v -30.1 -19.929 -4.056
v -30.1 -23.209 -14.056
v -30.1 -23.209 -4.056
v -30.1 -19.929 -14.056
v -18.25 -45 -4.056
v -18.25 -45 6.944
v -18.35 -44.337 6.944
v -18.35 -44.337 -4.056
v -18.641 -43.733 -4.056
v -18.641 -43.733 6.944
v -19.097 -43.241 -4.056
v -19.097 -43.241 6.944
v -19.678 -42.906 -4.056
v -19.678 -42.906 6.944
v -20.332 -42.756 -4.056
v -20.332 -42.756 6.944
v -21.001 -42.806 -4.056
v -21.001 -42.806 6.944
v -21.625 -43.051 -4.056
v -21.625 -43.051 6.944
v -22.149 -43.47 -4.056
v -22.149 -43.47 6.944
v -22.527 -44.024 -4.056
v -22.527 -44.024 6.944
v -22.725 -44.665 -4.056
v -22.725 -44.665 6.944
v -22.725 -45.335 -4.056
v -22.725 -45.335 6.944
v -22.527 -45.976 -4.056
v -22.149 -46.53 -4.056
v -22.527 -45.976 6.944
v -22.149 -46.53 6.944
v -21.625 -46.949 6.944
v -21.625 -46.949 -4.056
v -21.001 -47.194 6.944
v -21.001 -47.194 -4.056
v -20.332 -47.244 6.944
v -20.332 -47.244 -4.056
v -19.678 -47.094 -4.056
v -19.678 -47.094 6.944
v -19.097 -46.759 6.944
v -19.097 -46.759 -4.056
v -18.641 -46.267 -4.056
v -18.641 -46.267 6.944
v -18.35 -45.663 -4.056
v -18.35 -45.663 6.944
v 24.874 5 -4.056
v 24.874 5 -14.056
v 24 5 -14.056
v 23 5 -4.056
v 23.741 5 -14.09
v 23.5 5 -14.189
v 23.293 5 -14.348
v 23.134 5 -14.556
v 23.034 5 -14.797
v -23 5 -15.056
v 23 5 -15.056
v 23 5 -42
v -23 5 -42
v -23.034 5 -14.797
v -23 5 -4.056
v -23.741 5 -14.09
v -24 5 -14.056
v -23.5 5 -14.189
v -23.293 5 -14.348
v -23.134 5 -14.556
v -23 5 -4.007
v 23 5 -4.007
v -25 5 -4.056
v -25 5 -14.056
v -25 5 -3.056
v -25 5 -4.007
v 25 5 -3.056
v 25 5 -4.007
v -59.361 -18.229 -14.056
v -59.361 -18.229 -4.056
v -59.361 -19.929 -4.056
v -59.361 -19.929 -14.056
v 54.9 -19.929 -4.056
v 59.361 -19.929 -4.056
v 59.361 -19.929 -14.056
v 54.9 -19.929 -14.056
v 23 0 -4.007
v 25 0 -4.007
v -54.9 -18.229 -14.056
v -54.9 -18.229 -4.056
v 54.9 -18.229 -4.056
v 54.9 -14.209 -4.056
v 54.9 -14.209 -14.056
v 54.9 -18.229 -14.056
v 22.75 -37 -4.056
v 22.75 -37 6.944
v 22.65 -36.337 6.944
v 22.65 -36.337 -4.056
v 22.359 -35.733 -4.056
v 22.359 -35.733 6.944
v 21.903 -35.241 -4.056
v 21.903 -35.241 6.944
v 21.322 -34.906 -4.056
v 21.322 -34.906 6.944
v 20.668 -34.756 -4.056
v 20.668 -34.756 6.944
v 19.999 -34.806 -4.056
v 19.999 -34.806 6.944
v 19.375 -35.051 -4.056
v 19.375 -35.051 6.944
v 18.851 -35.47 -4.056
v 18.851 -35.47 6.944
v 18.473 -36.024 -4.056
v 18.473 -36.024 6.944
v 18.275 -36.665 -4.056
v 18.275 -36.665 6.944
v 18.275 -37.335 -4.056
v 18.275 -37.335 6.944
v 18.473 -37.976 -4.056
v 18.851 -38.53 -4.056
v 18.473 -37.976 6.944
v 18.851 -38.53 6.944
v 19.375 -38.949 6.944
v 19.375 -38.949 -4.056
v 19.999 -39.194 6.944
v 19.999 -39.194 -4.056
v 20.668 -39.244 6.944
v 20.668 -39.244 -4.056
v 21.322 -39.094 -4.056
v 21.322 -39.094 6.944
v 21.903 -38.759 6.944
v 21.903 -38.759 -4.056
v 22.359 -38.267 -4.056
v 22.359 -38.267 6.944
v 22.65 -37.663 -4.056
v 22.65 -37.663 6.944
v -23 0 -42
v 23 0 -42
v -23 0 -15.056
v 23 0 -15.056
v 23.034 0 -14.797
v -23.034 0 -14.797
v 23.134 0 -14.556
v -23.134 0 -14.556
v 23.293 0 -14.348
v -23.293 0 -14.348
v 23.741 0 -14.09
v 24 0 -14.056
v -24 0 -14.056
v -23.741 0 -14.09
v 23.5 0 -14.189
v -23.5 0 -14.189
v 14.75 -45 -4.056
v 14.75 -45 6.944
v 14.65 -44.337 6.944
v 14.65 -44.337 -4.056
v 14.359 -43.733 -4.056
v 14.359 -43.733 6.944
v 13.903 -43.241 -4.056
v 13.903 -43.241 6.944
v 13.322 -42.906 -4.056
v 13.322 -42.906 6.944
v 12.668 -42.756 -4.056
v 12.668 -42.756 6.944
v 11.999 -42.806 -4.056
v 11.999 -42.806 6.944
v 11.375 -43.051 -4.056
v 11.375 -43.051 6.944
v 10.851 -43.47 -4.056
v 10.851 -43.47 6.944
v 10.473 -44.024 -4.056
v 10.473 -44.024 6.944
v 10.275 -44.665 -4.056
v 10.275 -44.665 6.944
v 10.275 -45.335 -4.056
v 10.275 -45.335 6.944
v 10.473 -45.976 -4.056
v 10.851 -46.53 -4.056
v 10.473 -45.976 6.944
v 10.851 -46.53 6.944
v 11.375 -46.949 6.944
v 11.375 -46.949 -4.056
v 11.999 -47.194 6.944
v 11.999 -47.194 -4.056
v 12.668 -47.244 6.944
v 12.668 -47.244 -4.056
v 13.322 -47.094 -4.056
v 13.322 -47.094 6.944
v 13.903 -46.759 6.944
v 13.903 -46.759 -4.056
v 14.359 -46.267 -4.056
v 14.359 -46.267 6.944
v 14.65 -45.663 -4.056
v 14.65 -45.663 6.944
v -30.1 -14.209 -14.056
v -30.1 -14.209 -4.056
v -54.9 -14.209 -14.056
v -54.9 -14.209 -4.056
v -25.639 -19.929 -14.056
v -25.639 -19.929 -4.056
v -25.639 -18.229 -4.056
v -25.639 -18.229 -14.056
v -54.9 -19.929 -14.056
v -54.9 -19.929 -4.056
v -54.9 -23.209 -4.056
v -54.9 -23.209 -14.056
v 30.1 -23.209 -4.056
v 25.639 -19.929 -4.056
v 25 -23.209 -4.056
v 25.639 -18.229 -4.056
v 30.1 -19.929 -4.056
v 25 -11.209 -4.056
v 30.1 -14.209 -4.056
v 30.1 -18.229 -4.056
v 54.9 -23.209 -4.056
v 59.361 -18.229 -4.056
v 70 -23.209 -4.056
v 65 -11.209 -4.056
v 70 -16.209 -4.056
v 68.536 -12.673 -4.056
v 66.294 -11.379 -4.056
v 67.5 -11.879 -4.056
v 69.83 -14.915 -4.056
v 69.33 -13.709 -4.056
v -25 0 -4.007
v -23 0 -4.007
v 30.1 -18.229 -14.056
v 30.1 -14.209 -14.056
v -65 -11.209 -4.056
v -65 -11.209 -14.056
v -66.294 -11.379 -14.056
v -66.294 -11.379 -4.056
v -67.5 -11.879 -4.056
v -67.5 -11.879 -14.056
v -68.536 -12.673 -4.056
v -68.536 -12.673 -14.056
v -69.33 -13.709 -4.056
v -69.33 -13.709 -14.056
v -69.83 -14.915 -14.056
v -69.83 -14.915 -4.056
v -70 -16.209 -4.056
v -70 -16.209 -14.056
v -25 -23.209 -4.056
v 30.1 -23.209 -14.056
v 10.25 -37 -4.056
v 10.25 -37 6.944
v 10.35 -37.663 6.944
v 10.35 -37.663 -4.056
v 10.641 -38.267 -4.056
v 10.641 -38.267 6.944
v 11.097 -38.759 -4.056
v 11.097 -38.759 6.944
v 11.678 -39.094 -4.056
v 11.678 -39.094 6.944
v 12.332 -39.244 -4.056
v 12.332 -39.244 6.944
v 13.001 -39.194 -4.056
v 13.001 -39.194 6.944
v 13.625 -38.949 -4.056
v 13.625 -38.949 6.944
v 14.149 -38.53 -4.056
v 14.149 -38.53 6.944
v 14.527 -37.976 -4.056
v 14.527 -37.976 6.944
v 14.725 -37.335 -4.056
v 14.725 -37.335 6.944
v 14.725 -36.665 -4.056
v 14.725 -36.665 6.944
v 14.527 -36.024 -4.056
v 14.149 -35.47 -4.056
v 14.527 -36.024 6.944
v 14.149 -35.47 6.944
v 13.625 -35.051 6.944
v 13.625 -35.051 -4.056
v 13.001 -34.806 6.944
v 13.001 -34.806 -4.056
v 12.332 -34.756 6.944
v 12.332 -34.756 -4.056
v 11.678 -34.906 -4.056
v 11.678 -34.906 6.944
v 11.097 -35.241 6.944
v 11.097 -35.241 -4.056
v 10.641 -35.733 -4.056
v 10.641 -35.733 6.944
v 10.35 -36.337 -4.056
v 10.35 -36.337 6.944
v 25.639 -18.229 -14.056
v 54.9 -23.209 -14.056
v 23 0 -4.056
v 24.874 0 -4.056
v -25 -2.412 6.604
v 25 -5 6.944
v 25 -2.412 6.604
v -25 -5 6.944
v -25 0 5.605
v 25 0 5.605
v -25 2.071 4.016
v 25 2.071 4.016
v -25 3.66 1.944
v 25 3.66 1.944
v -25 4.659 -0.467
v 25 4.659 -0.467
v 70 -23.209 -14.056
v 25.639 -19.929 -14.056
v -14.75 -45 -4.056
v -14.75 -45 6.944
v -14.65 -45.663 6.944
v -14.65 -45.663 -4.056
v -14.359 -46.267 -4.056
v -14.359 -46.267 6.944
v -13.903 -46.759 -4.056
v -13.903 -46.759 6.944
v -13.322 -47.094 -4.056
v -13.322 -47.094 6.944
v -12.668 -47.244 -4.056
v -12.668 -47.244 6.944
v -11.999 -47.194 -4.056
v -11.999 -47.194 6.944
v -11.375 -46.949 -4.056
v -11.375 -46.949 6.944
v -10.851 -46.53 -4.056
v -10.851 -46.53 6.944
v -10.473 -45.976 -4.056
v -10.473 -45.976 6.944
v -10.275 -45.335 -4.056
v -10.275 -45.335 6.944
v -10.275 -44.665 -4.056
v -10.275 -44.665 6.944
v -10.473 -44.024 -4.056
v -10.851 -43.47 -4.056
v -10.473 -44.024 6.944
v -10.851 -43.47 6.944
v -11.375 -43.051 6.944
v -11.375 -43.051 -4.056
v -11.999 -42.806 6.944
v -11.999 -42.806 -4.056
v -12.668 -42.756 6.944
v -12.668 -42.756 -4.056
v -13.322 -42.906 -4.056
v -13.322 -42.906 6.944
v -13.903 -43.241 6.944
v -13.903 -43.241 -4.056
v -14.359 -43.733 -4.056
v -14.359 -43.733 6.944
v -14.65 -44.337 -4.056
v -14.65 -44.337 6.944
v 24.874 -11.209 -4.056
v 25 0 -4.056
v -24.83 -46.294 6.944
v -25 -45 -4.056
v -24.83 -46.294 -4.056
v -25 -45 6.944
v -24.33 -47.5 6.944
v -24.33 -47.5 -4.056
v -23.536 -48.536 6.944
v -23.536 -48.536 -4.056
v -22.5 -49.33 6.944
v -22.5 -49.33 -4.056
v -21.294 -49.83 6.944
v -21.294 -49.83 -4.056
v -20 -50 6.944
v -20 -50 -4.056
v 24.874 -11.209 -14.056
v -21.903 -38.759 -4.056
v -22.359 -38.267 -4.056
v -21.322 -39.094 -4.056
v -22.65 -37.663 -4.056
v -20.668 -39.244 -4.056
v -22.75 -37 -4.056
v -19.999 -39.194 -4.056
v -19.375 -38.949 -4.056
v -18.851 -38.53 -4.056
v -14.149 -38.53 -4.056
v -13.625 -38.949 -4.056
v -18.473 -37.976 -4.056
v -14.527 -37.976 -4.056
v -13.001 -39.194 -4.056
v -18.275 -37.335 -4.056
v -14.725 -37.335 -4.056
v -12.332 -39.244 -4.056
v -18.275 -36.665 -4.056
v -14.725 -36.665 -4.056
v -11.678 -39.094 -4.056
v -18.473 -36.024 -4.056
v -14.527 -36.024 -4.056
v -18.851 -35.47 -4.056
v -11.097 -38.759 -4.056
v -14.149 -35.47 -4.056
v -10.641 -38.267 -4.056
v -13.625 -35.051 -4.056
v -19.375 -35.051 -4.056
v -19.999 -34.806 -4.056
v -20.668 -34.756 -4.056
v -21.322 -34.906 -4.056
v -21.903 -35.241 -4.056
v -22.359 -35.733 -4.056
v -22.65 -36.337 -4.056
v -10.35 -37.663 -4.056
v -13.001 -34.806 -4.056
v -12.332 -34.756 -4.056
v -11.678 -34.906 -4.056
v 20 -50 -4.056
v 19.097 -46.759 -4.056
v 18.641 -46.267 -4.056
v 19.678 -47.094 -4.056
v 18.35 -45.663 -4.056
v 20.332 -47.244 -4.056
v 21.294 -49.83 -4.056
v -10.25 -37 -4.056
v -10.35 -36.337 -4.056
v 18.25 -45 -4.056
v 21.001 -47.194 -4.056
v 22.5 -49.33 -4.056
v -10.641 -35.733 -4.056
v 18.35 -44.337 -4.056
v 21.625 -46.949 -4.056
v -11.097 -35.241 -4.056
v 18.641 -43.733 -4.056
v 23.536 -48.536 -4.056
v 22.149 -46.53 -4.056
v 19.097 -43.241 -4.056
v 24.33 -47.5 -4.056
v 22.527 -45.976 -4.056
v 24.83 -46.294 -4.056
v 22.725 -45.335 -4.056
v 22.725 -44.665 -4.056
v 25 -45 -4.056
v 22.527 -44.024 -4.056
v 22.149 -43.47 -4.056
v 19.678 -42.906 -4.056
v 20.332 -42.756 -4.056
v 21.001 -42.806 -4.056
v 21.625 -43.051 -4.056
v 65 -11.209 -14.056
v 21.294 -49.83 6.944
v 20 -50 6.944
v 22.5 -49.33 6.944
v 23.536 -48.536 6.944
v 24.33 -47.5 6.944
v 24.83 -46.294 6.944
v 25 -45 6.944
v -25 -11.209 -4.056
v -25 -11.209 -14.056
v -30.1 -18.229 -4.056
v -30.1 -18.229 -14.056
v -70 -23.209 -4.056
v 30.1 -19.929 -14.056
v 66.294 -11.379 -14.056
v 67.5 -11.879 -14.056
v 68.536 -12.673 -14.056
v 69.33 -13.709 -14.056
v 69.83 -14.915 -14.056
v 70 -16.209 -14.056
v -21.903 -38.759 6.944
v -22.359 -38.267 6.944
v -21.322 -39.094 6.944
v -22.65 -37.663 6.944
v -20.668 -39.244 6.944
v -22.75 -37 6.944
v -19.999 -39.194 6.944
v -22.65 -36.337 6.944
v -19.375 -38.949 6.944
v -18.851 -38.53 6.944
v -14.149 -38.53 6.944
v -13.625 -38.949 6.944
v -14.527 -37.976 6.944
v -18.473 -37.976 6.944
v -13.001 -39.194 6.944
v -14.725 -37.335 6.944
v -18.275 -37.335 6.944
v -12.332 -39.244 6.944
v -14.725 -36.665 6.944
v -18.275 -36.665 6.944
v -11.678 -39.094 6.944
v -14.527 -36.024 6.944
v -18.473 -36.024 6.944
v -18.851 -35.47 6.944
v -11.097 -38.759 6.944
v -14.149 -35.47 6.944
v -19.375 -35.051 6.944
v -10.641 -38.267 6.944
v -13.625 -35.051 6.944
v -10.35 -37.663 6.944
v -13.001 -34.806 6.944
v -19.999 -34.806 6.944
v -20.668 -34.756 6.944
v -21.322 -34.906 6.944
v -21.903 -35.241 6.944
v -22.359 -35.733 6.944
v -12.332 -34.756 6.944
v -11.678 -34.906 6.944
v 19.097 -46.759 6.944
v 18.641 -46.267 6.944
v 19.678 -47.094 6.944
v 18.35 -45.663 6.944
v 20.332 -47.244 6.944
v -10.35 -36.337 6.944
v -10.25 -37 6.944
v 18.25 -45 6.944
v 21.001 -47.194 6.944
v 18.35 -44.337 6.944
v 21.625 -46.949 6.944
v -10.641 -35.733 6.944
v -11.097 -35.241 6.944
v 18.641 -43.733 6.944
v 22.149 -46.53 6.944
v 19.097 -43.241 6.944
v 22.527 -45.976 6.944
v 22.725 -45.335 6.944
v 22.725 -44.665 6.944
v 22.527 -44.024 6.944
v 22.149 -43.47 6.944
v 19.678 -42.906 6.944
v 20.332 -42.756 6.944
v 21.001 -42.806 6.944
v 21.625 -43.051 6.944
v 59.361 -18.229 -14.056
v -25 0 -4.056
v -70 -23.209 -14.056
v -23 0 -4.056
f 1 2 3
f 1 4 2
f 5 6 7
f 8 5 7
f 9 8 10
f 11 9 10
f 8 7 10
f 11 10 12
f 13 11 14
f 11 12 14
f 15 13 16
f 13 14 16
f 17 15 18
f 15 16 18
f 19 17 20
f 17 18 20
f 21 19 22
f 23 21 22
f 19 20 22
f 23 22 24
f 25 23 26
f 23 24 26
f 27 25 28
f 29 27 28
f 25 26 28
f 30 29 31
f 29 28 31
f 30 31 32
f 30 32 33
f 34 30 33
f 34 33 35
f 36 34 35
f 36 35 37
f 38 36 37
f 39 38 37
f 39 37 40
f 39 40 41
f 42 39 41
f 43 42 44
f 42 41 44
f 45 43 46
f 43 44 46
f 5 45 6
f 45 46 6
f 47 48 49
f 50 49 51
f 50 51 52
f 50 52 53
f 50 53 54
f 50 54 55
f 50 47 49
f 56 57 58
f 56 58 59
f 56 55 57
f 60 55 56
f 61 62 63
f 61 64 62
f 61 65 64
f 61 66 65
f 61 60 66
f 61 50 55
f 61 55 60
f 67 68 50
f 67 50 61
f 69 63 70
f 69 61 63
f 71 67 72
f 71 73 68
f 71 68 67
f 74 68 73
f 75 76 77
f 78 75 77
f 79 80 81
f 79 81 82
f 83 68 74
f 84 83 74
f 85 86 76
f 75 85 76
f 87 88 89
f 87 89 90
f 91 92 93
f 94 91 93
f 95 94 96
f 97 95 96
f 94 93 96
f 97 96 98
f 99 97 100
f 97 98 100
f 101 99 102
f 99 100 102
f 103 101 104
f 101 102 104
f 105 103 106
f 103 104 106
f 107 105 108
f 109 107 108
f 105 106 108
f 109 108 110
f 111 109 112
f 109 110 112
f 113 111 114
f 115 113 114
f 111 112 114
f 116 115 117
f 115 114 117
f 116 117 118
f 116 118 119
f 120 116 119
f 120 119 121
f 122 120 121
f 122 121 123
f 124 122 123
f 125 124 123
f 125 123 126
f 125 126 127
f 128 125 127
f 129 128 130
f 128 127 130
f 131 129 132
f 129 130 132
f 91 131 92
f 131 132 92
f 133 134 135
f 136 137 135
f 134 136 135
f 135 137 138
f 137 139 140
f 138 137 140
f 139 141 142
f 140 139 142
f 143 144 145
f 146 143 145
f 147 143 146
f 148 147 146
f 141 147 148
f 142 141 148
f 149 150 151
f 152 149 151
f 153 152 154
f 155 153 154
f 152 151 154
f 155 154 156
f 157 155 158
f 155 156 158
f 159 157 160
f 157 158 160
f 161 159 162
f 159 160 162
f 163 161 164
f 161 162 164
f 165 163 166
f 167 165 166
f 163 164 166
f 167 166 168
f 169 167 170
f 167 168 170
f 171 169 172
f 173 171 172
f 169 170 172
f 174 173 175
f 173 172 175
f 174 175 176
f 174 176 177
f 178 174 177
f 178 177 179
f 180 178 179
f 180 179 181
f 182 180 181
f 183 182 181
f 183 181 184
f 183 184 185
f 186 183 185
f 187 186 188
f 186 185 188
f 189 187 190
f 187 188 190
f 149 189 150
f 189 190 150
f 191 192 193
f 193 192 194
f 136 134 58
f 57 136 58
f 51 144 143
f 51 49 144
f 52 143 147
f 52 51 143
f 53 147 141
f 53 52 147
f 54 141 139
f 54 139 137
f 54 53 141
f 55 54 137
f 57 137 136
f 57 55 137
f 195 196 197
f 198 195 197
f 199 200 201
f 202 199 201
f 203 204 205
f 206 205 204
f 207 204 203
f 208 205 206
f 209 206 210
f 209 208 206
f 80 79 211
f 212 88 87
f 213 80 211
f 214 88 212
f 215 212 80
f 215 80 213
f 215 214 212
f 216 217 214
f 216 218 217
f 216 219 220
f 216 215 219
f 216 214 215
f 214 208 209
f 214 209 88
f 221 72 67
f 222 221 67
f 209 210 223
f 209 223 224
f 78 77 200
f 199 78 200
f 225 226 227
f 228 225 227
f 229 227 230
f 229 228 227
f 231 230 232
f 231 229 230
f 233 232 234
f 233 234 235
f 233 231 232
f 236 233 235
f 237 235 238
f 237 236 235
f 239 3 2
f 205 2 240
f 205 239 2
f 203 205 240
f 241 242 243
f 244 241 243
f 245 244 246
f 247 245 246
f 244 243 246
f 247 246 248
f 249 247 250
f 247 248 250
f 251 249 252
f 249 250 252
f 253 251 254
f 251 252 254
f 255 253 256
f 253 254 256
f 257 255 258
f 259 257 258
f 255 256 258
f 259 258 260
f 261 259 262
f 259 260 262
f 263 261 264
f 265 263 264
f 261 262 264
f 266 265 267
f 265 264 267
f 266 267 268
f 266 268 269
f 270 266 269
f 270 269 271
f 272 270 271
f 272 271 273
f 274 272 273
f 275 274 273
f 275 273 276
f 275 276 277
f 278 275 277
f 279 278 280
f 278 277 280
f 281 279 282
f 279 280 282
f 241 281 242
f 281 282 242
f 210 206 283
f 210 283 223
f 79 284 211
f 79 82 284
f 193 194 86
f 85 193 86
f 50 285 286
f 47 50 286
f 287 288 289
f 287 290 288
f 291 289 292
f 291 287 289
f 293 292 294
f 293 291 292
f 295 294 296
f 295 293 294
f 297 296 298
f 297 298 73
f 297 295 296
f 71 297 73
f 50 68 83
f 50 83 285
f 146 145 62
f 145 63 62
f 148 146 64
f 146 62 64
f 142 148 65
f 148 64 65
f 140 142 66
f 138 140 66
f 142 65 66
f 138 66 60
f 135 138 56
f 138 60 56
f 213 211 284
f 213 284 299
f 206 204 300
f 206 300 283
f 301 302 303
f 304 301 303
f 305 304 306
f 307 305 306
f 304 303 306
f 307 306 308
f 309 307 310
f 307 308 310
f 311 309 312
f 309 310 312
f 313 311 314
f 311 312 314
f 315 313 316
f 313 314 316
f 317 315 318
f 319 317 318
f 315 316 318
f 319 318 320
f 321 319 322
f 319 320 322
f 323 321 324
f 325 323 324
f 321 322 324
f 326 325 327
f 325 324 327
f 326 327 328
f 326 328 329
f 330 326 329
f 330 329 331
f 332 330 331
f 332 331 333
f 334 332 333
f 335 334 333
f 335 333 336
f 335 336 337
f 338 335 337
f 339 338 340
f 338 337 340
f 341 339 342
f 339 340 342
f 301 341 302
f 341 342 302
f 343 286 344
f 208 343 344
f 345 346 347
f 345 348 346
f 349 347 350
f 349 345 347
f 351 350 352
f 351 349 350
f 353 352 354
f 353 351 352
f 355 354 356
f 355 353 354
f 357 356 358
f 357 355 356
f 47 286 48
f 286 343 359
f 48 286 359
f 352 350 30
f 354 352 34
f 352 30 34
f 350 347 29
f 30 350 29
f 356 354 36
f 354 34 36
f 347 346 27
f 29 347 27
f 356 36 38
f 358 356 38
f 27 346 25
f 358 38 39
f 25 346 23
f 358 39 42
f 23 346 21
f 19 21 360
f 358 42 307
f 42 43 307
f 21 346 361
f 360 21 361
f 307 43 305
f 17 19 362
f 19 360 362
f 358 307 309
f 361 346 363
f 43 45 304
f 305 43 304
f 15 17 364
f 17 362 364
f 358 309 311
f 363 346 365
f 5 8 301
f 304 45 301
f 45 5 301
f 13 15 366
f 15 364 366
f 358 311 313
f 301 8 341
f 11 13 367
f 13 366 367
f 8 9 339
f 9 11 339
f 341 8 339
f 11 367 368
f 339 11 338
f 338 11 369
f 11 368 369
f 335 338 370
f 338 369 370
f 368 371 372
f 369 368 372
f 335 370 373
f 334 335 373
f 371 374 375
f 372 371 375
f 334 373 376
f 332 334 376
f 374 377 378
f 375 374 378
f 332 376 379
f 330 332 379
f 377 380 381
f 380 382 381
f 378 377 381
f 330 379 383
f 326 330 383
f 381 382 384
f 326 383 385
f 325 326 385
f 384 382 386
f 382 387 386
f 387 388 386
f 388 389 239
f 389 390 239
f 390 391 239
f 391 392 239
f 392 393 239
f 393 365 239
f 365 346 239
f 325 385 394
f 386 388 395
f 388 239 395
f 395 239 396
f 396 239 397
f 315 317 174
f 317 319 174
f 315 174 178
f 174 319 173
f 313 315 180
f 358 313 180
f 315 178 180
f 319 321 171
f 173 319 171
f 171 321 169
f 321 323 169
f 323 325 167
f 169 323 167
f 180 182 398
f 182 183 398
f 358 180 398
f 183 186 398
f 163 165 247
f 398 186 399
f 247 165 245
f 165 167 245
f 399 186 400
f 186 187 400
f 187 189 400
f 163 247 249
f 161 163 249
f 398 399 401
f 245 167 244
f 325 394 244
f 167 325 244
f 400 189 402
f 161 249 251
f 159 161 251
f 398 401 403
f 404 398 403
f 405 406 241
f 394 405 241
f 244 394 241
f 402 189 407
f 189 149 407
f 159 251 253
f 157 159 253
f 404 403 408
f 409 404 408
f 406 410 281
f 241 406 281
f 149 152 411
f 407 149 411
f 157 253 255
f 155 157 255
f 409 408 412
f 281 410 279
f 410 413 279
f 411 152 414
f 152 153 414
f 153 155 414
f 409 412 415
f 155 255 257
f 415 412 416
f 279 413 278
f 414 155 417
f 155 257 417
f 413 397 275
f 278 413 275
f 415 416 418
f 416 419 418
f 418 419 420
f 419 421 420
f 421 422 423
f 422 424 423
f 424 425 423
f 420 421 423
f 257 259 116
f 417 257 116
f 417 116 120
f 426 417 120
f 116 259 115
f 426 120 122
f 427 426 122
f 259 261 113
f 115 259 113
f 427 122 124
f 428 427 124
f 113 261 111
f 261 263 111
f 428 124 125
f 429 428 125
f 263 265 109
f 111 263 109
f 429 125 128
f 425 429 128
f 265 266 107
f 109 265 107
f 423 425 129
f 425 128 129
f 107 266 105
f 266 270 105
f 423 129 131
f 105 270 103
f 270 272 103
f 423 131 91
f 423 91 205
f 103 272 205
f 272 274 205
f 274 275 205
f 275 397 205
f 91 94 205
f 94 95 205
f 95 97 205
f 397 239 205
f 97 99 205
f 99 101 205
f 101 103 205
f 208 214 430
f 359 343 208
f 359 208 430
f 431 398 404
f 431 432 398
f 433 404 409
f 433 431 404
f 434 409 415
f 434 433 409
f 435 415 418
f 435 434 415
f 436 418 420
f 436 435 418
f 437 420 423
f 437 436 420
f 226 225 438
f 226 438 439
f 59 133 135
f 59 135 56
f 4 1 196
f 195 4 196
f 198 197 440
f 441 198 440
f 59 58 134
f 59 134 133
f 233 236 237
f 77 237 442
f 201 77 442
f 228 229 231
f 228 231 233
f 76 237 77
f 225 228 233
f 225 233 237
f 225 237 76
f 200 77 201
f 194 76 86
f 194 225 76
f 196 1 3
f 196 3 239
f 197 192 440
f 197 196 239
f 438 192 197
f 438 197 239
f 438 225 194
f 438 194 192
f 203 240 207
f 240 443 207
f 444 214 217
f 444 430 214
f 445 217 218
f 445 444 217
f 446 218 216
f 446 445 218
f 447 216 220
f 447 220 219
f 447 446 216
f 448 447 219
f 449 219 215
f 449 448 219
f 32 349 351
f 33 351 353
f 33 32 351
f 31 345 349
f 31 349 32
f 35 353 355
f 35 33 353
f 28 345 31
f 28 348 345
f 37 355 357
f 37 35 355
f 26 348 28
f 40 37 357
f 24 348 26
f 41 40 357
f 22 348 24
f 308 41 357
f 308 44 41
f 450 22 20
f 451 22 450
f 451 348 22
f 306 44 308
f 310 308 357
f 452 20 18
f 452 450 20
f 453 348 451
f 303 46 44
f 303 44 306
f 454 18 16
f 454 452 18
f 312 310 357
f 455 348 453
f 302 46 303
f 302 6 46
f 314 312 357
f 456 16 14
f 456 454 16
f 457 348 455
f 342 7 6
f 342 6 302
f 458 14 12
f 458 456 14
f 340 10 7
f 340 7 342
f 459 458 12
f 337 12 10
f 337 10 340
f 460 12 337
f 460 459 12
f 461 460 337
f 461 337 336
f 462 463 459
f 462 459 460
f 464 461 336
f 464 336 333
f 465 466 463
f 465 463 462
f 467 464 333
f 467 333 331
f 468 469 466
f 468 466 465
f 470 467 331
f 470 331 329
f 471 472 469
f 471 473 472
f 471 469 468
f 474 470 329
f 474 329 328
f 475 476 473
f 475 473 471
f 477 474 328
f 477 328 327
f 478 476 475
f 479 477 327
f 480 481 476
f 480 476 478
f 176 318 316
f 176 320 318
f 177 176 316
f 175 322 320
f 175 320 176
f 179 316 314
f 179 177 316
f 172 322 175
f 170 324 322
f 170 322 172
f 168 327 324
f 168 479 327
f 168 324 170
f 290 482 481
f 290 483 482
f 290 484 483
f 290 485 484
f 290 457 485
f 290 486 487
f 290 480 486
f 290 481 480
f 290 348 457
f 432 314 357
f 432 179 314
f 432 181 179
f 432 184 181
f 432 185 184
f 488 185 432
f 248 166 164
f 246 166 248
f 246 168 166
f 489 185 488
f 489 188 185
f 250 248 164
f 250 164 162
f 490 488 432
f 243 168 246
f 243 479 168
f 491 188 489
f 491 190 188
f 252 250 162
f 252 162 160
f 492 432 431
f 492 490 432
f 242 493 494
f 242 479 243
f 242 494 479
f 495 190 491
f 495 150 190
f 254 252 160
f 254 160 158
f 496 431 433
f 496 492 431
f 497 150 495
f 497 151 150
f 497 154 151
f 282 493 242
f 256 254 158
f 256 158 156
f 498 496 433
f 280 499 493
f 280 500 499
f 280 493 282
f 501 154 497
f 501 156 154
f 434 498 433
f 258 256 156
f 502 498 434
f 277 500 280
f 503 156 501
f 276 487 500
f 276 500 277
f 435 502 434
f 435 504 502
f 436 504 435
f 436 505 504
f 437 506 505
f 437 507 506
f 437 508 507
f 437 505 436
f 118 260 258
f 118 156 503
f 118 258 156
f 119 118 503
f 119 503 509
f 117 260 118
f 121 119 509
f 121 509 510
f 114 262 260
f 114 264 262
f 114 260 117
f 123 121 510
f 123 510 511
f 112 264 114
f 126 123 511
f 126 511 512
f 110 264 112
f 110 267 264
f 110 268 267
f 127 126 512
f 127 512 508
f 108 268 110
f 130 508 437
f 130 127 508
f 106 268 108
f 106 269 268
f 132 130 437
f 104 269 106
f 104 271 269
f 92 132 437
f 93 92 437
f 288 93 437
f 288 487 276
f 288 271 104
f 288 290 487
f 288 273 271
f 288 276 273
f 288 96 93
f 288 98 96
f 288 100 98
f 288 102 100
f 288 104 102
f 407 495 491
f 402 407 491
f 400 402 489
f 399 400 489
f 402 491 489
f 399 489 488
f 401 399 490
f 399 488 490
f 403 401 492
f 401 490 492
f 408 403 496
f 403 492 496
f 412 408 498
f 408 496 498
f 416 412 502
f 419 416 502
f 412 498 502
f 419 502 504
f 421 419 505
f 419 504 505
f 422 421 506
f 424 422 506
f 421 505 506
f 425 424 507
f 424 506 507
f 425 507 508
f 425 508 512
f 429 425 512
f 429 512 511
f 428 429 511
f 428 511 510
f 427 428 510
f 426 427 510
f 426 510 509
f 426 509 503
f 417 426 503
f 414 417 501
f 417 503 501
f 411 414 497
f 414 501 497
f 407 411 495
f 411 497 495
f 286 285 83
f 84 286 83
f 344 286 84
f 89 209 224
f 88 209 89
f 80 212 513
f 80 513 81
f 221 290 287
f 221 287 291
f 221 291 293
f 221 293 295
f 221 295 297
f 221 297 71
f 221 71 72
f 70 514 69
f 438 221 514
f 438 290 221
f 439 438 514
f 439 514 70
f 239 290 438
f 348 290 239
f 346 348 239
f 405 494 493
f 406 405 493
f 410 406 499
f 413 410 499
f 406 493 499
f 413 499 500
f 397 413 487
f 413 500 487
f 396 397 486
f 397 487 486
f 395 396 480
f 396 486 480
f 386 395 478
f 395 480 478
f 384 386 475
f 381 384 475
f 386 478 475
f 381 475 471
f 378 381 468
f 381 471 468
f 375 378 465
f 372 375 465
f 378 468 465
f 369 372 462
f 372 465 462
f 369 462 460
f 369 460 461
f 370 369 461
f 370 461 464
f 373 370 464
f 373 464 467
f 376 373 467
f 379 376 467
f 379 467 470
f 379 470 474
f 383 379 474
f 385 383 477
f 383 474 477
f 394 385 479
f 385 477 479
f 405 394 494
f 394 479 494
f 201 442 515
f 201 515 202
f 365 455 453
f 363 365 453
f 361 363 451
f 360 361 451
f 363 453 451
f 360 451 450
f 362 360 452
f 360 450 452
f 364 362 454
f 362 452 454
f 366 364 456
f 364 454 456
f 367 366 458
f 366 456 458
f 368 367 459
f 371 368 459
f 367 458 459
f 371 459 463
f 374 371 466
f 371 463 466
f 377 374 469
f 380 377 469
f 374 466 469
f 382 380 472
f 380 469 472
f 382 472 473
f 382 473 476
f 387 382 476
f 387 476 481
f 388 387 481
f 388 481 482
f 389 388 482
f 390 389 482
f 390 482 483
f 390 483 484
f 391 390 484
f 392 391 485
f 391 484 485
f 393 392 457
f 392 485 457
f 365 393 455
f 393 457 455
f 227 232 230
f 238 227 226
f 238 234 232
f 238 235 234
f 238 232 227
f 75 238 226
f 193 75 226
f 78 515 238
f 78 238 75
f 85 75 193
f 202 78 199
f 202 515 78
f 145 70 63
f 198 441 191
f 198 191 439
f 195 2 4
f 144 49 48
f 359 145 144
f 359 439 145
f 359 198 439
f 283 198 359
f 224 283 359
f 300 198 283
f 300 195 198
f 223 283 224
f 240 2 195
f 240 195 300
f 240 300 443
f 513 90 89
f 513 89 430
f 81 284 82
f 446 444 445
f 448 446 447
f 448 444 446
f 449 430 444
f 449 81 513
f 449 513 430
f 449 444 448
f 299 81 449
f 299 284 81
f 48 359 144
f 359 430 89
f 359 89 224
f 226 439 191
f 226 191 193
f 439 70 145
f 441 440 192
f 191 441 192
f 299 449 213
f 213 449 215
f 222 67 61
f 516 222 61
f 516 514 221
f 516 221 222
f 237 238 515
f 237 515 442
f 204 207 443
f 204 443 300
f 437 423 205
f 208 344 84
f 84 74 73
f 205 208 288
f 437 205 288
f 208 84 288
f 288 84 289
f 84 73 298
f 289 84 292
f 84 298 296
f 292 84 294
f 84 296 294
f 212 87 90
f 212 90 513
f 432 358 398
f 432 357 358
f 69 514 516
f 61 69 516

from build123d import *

# Parameters (mm, degrees)
BOSS_EXTRUDE5_DEPTH  = 5
SKETCH3_W            = 50
SKETCH3_H            = 11
BOSS_EXTRUDE6_DEPTH  = 50
SKETCH5_R            = 2.25
CUT_EXTRUDE1_DEPTH   = 11
BOSS_EXTRUDE8_DEPTH  = 10
CUT_EXTRUDE2_DEPTH   = 10
SKETCH8_W            = 2
SKETCH8_H            = 15.993233409
CUT_EXTRUDE3_DEPTH   = 5
SKETCH9_W            = 10
SKETCH9_H            = 10
BOSS_EXTRUDE9_DEPTH  = 10
SKETCH10_W           = 10
SKETCH10_H           = 10
BOSS_EXTRUDE10_DEPTH = 10
FILLET1_R            = 10
FILLET2_R            = 5
SKETCH11_W           = 15.1
SKETCH11_H           = 10
BOSS_EXTRUDE11_DEPTH = 2
SKETCH12_W           = 60.2
SKETCH12_H           = 10
BOSS_EXTRUDE12_DEPTH = 2
BOSS_EXTRUDE14_REACH = 84.491
SKETCH14_W           = 49.873600962
SKETCH14_H           = 10
FILLET3_R            = 1
SKETCH15_W           = 46
SKETCH15_H           = 5
BOSS_EXTRUDE15_DEPTH = 22


with BuildPart() as part:
    # Sketch1 → Boss-Extrude5 (new body)
    with BuildSketch(Plane(origin=(0, 0, 0), x_dir=(1, 0, 0), z_dir=(0, 1, 0))):
        Polygon((-25, 20), (25, 20), (25, 0), (25, -6.94447706), (-25, -6.94447706), (-25, 0.55552294), align=None)
    extrude(amount=BOSS_EXTRUDE5_DEPTH)

    # Sketch3 → Boss-Extrude6 (add)
    with BuildSketch(Plane.XZ):
        with Locations((0, 1.44447706)):
            Rectangle(SKETCH3_W, SKETCH3_H)
    extrude(amount=BOSS_EXTRUDE6_DEPTH)

    # Sketch5 → Cut-Extrude1 (cut)
    with BuildSketch(Plane.XY.offset(6.94447706)):
        with Locations((-20.5, -45)):
            Circle(SKETCH5_R)
        with Locations(Location((-20.5, -37, 0), (0, 0, 180))):
            Circle(SKETCH5_R)
        with Locations(Location((-12.5, -45, 0), (0, 0, 180))):
            Circle(SKETCH5_R)
        with Locations((-12.5, -37)):
            Circle(SKETCH5_R)
        with Locations((12.5, -45)):
            Circle(SKETCH5_R)
        with Locations(Location((20.5, -45, 0), (0, 0, 180))):
            Circle(SKETCH5_R)
        with Locations(Location((12.5, -37, 0), (0, 0, 180))):
            Circle(SKETCH5_R)
        with Locations((20.5, -37)):
            Circle(SKETCH5_R)
    extrude(amount=-CUT_EXTRUDE1_DEPTH, mode=Mode.SUBTRACT)

    # Sketch6 → Boss-Extrude8 (add)
    with BuildSketch(Plane(origin=(0, 0, -4.05552294), x_dir=(-1, 0, 0), z_dir=(0, 0, -1))):
        Polygon((-25, -11.208830651), (25, -11.208830651), (60, -11.208830651), (60, -21.208830651), (25, -21.208830651), (-25, -21.208830651), (-60, -21.208830651), (-60, -11.208830651), align=None)
    extrude(amount=BOSS_EXTRUDE8_DEPTH)

    # Sketch7 → Cut-Extrude2 (cut)
    with BuildSketch(Plane.XY.offset(-4.05552294)):
        Polygon((30.1, -21.208830651), (30.1, -19.929430473), (25.639200757, -19.929430473), (25.639200757, -18.229430473), (30.1, -18.229430473), (30.1, -14.208830651), (54.9, -14.208830651), (54.9, -18.229430473), (59.360799243, -18.229430473), (59.360799243, -19.929430473), (54.9, -19.929430473), (54.9, -21.208830651), align=None)
        Polygon((-25.639200757, -19.929430473), (-25.639200757, -18.229430473), (-30.1, -18.229430473), (-30.1, -14.208830651), (-54.9, -14.208830651), (-54.9, -18.229430473), (-59.360799243, -18.229430473), (-59.360799243, -19.929430473), (-54.9, -19.929430473), (-54.9, -21.208830651), (-30.1, -21.208830651), (-30.1, -19.929430473), align=None)
    extrude(amount=-CUT_EXTRUDE2_DEPTH, mode=Mode.SUBTRACT)

    # Sketch8 → Cut-Extrude3 (cut)
    with BuildSketch(Plane(origin=(0, 5, 0), x_dir=(1, 0, 0), z_dir=(0, 1, 0))):
        with Locations((-24, 12.003383296)):
            Rectangle(SKETCH8_W, SKETCH8_H)
        with Locations((24, 12.003383296)):
            Rectangle(SKETCH8_W, SKETCH8_H)
    extrude(amount=-CUT_EXTRUDE3_DEPTH, mode=Mode.SUBTRACT)

    # Sketch9 → Boss-Extrude9 (add)
    with BuildSketch(Plane.ZY.offset(60)):
        with Locations((-9.05552294, -16.208830651)):
            Rectangle(SKETCH9_W, SKETCH9_H)
    extrude(amount=BOSS_EXTRUDE9_DEPTH)

    # Sketch10 → Boss-Extrude10 (add)
    with BuildSketch(Plane(origin=(60, 0, 0), x_dir=(0, 0, -1), z_dir=(1, 0, 0))):
        with Locations((9.05552294, -16.208830651)):
            Rectangle(SKETCH10_W, SKETCH10_H)
    extrude(amount=BOSS_EXTRUDE10_DEPTH)

    # Fillet1
    fillet1_edges = [part.edges().sort_by_distance(p)[0] for p in [
        (0, 5, 6.94447706),
    ]]
    fillet(fillet1_edges, radius=FILLET1_R)

    # Fillet2
    fillet2_edges = [part.edges().sort_by_distance(p)[0] for p in [
        (-70, -11.208830651, -9.05552294),
        (70, -11.208830651, -9.05552294),
        (-25, -50, 1.44447706),
        (25, -50, 1.44447706),
    ]]
    fillet(fillet2_edges, radius=FILLET2_R)

    # Sketch11 → Boss-Extrude11 (add)
    with BuildSketch(Plane.XZ.offset(21.208830651)):
        with Locations((62.45, -9.05552294)):
            Rectangle(SKETCH11_W, SKETCH11_H)
        with Locations((-62.45, -9.05552294)):
            Rectangle(SKETCH11_W, SKETCH11_H)
    extrude(amount=BOSS_EXTRUDE11_DEPTH)

    # Sketch12 → Boss-Extrude12 (add)
    with BuildSketch(Plane.XZ.offset(21.208830651)):
        with Locations((0, -9.05552294)):
            Rectangle(SKETCH12_W, SKETCH12_H)
    extrude(amount=BOSS_EXTRUDE12_DEPTH)

    # Boss-Extrude14: up to this face of the body (flat: up to its plane)
    boss_extrude14_end = Plane(part.part.faces().sort_by_distance((0, 5, -11.488914502))[0])
    # Sketch14 → Boss-Extrude14 (add, up to the picked face)
    with BuildSketch(Plane(origin=(0, -11.208830651, 0), x_dir=(1, 0, 0), z_dir=(0, 1, 0)), mode=Mode.PRIVATE) as boss_extrude14_sk1:
        with Locations((-0.063199519, 9.05552294)):
            Rectangle(SKETCH14_W, SKETCH14_H)
    boss_extrude14_tool1 = split(extrude(boss_extrude14_sk1.sketch, amount=BOSS_EXTRUDE14_REACH, mode=Mode.PRIVATE), bisect_by=boss_extrude14_end, keep=Keep.BOTH, mode=Mode.PRIVATE)
    add(boss_extrude14_tool1.solids().sort_by(Axis((-0.0632, -11.208831, -9.055523), (0, 1, 0)))[0])

    # Fillet3
    fillet3_edges = [part.edges().sort_by_distance(p)[0] for p in [
        (-23, 2.5, -14.05552294),
        (23, 2.5, -14.05552294),
    ]]
    fillet(fillet3_edges, radius=FILLET3_R)

    # Sketch15 → Boss-Extrude15 (add)
    with BuildSketch(Plane(origin=(0, 0, -20), x_dir=(-1, 0, 0), z_dir=(0, 0, -1))):
        with Locations((0, 2.5)):
            Rectangle(SKETCH15_W, SKETCH15_H)
    extrude(amount=BOSS_EXTRUDE15_DEPTH)


solid = part.part
